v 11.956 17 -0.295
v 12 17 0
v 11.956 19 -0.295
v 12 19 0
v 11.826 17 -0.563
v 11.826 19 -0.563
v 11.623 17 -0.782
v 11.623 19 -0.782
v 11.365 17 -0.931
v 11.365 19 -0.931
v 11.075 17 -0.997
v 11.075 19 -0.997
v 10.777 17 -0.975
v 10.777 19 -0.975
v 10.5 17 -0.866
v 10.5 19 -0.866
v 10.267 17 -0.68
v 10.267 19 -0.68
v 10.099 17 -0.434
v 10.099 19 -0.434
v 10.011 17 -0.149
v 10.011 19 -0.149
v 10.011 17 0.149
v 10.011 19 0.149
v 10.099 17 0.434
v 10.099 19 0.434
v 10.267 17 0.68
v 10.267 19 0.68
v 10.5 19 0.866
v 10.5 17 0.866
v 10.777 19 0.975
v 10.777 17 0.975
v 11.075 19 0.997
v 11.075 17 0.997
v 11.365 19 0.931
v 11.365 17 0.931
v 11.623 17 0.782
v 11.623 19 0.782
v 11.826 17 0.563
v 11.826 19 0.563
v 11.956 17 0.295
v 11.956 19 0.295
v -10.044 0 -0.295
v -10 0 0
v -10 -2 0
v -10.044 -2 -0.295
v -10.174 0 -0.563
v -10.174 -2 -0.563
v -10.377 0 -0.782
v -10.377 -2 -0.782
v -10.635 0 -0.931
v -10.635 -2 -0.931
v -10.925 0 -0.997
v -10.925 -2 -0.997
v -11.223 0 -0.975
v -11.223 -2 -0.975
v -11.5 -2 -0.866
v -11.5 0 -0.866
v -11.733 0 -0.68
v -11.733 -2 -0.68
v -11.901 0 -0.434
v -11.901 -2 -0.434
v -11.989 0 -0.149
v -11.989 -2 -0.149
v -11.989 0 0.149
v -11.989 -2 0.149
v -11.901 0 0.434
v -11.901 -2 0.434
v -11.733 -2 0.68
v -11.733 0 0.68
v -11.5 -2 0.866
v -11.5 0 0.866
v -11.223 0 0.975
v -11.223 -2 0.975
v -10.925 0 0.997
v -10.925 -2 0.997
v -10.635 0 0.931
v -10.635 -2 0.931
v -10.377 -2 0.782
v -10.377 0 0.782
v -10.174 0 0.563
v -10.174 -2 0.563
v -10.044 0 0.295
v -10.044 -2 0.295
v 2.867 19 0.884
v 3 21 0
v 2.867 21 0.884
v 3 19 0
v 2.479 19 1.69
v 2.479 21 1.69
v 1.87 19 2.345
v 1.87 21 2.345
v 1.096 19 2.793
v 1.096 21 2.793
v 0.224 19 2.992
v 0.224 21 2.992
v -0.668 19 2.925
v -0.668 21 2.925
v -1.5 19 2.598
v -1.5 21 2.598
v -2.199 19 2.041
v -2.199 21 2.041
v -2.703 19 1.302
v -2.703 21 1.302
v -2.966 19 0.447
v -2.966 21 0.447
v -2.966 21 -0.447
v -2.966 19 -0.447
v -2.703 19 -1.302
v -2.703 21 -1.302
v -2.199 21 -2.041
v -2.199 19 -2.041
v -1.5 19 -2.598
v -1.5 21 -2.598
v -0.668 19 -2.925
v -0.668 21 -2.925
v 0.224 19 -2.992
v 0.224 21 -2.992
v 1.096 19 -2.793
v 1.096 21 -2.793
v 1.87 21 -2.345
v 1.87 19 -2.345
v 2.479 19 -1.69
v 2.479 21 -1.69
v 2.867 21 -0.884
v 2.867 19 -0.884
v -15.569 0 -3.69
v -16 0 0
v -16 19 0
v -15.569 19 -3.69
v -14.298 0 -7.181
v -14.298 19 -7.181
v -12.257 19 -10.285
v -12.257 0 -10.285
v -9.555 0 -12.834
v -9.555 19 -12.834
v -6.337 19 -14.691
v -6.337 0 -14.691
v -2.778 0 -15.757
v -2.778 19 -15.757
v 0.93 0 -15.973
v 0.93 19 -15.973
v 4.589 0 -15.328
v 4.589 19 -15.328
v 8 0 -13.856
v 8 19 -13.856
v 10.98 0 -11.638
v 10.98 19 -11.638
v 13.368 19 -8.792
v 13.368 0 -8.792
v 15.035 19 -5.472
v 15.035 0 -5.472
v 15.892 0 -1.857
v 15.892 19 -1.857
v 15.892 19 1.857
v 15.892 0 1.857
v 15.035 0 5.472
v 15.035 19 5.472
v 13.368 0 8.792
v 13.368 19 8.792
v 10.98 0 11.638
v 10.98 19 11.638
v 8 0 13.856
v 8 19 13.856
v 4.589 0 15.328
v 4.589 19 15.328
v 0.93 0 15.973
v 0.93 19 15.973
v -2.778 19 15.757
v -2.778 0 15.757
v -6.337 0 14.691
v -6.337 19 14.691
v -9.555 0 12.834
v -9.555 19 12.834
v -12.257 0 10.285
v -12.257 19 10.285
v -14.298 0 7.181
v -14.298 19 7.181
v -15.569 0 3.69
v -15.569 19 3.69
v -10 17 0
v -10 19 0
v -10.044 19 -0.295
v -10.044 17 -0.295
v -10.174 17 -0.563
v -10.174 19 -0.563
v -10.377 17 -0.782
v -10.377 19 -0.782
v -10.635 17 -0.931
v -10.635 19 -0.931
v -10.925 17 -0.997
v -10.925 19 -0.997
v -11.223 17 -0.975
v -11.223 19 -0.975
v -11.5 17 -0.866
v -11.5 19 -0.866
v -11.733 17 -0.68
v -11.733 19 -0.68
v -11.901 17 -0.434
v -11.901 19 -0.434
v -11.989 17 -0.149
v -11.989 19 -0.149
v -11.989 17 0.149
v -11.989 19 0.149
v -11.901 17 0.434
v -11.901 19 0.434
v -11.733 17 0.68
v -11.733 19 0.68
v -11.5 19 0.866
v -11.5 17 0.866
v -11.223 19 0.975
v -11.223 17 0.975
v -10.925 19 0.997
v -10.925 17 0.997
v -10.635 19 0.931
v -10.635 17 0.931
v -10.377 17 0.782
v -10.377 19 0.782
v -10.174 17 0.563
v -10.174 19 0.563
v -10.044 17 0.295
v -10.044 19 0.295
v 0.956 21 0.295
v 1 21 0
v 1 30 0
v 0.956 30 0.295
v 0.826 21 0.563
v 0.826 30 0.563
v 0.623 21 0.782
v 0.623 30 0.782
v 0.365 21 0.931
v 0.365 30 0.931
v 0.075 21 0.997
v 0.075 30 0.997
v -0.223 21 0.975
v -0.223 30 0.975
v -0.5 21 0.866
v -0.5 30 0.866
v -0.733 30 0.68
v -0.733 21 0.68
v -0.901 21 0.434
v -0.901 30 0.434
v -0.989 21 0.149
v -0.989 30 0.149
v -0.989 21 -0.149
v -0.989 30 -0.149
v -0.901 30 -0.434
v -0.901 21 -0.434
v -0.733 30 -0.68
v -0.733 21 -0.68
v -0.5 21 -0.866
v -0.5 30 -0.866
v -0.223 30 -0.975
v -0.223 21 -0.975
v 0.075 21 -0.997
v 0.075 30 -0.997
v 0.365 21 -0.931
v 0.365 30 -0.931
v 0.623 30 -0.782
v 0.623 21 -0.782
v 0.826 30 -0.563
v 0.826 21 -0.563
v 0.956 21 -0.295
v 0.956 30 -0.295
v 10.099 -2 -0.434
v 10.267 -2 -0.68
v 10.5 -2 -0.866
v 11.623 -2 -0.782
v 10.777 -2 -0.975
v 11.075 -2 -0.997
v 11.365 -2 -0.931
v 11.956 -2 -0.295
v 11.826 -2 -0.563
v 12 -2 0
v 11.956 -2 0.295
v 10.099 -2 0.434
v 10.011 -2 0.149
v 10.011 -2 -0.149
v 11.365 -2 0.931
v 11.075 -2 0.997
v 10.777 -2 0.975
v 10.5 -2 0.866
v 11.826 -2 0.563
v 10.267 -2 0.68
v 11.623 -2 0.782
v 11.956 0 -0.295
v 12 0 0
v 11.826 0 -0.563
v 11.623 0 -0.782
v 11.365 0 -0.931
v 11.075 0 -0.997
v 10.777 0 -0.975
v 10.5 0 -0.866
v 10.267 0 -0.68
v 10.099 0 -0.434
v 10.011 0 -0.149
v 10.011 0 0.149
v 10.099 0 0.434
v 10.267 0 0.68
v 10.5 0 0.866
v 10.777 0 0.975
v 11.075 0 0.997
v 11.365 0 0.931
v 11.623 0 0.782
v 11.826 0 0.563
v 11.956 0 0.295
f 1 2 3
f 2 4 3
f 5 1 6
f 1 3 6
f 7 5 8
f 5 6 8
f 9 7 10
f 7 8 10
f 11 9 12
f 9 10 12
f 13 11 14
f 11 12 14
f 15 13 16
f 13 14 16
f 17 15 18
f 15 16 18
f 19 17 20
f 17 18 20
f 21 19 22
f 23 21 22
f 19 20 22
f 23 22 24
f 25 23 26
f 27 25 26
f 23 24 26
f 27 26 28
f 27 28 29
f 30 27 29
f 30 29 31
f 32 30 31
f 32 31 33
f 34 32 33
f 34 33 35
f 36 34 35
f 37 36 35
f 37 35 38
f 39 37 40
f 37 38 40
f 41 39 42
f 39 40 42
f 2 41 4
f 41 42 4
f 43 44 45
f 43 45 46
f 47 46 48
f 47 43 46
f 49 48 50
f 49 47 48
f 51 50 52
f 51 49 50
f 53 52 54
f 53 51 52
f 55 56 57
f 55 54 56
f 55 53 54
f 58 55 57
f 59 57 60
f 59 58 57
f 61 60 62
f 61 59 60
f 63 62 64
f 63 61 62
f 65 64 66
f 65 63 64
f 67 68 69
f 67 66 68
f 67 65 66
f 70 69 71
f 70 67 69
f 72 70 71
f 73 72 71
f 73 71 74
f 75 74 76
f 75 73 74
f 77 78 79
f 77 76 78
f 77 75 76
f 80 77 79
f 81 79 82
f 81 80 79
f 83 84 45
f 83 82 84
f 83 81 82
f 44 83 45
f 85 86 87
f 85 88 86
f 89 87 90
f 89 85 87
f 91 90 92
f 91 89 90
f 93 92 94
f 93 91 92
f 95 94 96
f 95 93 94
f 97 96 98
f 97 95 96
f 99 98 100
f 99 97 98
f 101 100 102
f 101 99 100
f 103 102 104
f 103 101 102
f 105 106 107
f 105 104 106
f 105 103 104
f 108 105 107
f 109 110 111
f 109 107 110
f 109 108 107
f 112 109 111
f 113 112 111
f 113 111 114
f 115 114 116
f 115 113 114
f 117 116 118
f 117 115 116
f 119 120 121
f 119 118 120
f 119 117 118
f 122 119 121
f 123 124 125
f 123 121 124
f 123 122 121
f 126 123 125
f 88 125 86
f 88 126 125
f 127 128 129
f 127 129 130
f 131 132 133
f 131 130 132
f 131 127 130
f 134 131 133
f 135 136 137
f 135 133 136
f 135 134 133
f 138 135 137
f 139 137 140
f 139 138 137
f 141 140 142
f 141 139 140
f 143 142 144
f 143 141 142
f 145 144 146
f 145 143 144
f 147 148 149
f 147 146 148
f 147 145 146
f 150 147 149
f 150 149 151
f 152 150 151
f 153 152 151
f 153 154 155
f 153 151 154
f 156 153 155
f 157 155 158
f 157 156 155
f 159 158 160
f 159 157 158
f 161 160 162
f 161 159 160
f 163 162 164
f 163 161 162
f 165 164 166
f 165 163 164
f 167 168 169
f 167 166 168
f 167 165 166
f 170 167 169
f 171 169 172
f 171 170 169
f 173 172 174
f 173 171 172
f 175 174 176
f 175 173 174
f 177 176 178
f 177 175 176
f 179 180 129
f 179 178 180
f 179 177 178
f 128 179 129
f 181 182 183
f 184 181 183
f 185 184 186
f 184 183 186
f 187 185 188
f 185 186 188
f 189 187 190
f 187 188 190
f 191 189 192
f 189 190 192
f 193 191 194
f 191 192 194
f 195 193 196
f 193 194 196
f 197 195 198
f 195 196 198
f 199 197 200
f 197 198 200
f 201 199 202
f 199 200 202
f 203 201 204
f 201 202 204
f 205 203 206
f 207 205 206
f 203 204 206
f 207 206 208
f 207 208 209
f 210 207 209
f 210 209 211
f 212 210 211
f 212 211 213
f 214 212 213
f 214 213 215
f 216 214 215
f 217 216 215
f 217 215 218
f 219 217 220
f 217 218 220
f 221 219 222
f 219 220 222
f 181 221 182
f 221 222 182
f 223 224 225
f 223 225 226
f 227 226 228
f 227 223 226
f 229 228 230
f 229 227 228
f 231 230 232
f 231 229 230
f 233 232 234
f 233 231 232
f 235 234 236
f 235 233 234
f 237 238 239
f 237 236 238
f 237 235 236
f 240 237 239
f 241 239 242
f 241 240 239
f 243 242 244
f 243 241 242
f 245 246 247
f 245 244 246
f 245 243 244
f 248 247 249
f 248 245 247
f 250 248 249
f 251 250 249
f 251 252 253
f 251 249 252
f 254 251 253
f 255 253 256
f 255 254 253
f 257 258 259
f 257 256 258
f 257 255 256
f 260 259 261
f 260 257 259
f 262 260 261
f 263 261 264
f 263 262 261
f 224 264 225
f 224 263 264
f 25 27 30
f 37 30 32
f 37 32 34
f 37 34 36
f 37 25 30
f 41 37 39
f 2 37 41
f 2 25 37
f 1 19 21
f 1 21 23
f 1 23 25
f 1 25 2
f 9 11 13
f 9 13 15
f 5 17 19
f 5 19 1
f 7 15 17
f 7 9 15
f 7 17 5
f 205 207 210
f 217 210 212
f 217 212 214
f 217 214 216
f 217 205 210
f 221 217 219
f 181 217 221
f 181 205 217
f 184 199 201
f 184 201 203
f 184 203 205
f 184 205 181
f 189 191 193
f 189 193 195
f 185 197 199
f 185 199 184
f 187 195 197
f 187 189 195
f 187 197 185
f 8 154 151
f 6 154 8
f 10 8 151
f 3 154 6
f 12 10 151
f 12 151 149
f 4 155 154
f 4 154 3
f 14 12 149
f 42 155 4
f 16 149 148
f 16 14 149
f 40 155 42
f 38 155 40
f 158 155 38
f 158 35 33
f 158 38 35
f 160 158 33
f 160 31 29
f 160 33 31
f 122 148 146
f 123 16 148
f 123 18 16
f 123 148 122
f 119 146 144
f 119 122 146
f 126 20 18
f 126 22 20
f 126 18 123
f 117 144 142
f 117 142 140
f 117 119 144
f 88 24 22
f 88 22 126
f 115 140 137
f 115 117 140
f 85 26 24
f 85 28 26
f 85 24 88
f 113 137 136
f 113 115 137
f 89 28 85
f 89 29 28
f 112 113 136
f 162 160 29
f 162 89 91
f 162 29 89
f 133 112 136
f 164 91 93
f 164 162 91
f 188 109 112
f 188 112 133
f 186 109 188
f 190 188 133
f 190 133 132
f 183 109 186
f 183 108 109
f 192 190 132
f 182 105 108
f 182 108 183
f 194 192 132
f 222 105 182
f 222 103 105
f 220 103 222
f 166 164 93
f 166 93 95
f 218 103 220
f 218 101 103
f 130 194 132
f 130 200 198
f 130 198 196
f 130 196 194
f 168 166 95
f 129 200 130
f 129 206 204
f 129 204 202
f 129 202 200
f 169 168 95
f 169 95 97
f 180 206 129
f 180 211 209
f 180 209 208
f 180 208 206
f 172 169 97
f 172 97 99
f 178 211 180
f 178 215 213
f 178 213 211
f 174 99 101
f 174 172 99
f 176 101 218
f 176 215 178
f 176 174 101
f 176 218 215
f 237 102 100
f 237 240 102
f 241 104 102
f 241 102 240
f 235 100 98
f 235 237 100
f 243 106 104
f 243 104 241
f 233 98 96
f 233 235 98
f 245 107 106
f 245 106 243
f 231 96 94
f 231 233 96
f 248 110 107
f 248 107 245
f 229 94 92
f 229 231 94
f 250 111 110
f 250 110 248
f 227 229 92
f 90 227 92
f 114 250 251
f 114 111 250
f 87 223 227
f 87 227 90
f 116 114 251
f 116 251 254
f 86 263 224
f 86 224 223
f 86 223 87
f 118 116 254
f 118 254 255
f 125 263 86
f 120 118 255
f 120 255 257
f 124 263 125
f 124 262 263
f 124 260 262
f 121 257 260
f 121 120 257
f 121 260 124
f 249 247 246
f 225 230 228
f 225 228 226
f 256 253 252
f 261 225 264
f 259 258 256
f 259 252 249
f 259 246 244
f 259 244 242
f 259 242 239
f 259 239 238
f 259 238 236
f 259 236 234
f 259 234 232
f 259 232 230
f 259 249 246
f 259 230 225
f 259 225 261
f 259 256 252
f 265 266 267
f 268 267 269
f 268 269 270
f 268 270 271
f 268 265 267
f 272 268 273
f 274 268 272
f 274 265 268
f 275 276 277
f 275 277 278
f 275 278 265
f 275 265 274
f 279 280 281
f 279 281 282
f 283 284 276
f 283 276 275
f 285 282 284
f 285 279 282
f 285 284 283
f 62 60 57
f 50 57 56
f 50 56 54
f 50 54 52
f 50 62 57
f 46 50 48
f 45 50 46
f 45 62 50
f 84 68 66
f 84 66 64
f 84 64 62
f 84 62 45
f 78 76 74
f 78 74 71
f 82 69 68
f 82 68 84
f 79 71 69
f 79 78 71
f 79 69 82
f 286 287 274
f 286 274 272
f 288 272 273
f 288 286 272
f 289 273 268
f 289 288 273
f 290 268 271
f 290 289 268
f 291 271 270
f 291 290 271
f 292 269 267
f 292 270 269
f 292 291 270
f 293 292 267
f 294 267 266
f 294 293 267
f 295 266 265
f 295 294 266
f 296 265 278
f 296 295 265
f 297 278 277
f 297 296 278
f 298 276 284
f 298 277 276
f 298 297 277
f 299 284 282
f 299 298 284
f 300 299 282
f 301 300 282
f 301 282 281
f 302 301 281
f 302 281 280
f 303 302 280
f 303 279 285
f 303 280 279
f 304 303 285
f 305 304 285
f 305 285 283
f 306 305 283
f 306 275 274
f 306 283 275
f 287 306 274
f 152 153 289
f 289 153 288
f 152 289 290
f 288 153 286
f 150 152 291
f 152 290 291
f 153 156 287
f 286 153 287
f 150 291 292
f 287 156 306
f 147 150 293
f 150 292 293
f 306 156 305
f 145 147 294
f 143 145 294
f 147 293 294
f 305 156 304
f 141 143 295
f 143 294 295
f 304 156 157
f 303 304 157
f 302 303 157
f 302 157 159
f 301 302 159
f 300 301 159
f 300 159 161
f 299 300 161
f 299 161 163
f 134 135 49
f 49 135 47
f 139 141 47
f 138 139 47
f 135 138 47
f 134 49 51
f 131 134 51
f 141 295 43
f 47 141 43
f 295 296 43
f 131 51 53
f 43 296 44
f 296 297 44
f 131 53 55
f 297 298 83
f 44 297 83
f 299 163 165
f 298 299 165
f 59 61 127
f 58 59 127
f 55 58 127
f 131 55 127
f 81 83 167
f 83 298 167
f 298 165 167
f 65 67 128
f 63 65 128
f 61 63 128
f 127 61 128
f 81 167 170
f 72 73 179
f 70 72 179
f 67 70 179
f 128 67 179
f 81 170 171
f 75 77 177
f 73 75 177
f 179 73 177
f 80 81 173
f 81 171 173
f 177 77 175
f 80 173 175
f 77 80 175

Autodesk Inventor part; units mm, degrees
ref_plane "YZ Plane" through (0, 0, 0) normal (1, 0, 0) x (0, 1, 0)
ref_plane "XZ Plane" through (0, 0, 0) normal (0, 1, 0) x (-1, 0, 0)
ref_plane "XY Plane" through (0, 0, 0) normal (0, 0, 1) x (1, 0, 0)
sketch "Sketch1" plane through (0, 0, 0) normal (0, 1, 0) x (-1, 0, 0)
  circle A0 centre (0, 0) radius 16
  dimension "d0" = 32
extrude "Extrusion1" add sketch "Sketch1" along normal blind 19
sketch "Sketch2" plane through (0, 19, 0) normal (0, 1, 0) x (1, 0, 0)
  circle A0 centre (0, 0) radius 3
  dimension "d3" = 6
extrude "Extrusion2" add sketch "Sketch2" along normal blind 2
sketch "Sketch3" plane through (0, 21, 0) normal (0, 1, 0) x (1, 0, 0)
  circle A0 centre (0, 0) radius 1
  dimension "d6" = 2
extrude "Extrusion3" add sketch "Sketch3" along normal blind 9
sketch "Sketch4" plane through (0, 19, 0) normal (0, 1, 0) x (1, 0, 0)
  circle A0 centre (0, 0) radius 12
  line L0 (-12, 0) -> (-11, 0)
  circle A1 centre (11, 0) radius 1
  circle A2 centre (-11, 0) radius 1
  dimension "d9" = 24
extrude "Extrusion4" cut sketch "Sketch4" against normal blind 2 contours A2 | A1
sketch "Sketch5" plane through (0, 0, 0) normal (0, -1, 0) x (1, 0, 0)
  circle A0 centre (-11, 0) radius 1 projected
  circle A1 centre (11, 0) radius 1 projected
  point P0 (0, 0)
extrude "Extrusion5" add sketch "Sketch5" along normal blind 2
properties part number "Motor sensor"
